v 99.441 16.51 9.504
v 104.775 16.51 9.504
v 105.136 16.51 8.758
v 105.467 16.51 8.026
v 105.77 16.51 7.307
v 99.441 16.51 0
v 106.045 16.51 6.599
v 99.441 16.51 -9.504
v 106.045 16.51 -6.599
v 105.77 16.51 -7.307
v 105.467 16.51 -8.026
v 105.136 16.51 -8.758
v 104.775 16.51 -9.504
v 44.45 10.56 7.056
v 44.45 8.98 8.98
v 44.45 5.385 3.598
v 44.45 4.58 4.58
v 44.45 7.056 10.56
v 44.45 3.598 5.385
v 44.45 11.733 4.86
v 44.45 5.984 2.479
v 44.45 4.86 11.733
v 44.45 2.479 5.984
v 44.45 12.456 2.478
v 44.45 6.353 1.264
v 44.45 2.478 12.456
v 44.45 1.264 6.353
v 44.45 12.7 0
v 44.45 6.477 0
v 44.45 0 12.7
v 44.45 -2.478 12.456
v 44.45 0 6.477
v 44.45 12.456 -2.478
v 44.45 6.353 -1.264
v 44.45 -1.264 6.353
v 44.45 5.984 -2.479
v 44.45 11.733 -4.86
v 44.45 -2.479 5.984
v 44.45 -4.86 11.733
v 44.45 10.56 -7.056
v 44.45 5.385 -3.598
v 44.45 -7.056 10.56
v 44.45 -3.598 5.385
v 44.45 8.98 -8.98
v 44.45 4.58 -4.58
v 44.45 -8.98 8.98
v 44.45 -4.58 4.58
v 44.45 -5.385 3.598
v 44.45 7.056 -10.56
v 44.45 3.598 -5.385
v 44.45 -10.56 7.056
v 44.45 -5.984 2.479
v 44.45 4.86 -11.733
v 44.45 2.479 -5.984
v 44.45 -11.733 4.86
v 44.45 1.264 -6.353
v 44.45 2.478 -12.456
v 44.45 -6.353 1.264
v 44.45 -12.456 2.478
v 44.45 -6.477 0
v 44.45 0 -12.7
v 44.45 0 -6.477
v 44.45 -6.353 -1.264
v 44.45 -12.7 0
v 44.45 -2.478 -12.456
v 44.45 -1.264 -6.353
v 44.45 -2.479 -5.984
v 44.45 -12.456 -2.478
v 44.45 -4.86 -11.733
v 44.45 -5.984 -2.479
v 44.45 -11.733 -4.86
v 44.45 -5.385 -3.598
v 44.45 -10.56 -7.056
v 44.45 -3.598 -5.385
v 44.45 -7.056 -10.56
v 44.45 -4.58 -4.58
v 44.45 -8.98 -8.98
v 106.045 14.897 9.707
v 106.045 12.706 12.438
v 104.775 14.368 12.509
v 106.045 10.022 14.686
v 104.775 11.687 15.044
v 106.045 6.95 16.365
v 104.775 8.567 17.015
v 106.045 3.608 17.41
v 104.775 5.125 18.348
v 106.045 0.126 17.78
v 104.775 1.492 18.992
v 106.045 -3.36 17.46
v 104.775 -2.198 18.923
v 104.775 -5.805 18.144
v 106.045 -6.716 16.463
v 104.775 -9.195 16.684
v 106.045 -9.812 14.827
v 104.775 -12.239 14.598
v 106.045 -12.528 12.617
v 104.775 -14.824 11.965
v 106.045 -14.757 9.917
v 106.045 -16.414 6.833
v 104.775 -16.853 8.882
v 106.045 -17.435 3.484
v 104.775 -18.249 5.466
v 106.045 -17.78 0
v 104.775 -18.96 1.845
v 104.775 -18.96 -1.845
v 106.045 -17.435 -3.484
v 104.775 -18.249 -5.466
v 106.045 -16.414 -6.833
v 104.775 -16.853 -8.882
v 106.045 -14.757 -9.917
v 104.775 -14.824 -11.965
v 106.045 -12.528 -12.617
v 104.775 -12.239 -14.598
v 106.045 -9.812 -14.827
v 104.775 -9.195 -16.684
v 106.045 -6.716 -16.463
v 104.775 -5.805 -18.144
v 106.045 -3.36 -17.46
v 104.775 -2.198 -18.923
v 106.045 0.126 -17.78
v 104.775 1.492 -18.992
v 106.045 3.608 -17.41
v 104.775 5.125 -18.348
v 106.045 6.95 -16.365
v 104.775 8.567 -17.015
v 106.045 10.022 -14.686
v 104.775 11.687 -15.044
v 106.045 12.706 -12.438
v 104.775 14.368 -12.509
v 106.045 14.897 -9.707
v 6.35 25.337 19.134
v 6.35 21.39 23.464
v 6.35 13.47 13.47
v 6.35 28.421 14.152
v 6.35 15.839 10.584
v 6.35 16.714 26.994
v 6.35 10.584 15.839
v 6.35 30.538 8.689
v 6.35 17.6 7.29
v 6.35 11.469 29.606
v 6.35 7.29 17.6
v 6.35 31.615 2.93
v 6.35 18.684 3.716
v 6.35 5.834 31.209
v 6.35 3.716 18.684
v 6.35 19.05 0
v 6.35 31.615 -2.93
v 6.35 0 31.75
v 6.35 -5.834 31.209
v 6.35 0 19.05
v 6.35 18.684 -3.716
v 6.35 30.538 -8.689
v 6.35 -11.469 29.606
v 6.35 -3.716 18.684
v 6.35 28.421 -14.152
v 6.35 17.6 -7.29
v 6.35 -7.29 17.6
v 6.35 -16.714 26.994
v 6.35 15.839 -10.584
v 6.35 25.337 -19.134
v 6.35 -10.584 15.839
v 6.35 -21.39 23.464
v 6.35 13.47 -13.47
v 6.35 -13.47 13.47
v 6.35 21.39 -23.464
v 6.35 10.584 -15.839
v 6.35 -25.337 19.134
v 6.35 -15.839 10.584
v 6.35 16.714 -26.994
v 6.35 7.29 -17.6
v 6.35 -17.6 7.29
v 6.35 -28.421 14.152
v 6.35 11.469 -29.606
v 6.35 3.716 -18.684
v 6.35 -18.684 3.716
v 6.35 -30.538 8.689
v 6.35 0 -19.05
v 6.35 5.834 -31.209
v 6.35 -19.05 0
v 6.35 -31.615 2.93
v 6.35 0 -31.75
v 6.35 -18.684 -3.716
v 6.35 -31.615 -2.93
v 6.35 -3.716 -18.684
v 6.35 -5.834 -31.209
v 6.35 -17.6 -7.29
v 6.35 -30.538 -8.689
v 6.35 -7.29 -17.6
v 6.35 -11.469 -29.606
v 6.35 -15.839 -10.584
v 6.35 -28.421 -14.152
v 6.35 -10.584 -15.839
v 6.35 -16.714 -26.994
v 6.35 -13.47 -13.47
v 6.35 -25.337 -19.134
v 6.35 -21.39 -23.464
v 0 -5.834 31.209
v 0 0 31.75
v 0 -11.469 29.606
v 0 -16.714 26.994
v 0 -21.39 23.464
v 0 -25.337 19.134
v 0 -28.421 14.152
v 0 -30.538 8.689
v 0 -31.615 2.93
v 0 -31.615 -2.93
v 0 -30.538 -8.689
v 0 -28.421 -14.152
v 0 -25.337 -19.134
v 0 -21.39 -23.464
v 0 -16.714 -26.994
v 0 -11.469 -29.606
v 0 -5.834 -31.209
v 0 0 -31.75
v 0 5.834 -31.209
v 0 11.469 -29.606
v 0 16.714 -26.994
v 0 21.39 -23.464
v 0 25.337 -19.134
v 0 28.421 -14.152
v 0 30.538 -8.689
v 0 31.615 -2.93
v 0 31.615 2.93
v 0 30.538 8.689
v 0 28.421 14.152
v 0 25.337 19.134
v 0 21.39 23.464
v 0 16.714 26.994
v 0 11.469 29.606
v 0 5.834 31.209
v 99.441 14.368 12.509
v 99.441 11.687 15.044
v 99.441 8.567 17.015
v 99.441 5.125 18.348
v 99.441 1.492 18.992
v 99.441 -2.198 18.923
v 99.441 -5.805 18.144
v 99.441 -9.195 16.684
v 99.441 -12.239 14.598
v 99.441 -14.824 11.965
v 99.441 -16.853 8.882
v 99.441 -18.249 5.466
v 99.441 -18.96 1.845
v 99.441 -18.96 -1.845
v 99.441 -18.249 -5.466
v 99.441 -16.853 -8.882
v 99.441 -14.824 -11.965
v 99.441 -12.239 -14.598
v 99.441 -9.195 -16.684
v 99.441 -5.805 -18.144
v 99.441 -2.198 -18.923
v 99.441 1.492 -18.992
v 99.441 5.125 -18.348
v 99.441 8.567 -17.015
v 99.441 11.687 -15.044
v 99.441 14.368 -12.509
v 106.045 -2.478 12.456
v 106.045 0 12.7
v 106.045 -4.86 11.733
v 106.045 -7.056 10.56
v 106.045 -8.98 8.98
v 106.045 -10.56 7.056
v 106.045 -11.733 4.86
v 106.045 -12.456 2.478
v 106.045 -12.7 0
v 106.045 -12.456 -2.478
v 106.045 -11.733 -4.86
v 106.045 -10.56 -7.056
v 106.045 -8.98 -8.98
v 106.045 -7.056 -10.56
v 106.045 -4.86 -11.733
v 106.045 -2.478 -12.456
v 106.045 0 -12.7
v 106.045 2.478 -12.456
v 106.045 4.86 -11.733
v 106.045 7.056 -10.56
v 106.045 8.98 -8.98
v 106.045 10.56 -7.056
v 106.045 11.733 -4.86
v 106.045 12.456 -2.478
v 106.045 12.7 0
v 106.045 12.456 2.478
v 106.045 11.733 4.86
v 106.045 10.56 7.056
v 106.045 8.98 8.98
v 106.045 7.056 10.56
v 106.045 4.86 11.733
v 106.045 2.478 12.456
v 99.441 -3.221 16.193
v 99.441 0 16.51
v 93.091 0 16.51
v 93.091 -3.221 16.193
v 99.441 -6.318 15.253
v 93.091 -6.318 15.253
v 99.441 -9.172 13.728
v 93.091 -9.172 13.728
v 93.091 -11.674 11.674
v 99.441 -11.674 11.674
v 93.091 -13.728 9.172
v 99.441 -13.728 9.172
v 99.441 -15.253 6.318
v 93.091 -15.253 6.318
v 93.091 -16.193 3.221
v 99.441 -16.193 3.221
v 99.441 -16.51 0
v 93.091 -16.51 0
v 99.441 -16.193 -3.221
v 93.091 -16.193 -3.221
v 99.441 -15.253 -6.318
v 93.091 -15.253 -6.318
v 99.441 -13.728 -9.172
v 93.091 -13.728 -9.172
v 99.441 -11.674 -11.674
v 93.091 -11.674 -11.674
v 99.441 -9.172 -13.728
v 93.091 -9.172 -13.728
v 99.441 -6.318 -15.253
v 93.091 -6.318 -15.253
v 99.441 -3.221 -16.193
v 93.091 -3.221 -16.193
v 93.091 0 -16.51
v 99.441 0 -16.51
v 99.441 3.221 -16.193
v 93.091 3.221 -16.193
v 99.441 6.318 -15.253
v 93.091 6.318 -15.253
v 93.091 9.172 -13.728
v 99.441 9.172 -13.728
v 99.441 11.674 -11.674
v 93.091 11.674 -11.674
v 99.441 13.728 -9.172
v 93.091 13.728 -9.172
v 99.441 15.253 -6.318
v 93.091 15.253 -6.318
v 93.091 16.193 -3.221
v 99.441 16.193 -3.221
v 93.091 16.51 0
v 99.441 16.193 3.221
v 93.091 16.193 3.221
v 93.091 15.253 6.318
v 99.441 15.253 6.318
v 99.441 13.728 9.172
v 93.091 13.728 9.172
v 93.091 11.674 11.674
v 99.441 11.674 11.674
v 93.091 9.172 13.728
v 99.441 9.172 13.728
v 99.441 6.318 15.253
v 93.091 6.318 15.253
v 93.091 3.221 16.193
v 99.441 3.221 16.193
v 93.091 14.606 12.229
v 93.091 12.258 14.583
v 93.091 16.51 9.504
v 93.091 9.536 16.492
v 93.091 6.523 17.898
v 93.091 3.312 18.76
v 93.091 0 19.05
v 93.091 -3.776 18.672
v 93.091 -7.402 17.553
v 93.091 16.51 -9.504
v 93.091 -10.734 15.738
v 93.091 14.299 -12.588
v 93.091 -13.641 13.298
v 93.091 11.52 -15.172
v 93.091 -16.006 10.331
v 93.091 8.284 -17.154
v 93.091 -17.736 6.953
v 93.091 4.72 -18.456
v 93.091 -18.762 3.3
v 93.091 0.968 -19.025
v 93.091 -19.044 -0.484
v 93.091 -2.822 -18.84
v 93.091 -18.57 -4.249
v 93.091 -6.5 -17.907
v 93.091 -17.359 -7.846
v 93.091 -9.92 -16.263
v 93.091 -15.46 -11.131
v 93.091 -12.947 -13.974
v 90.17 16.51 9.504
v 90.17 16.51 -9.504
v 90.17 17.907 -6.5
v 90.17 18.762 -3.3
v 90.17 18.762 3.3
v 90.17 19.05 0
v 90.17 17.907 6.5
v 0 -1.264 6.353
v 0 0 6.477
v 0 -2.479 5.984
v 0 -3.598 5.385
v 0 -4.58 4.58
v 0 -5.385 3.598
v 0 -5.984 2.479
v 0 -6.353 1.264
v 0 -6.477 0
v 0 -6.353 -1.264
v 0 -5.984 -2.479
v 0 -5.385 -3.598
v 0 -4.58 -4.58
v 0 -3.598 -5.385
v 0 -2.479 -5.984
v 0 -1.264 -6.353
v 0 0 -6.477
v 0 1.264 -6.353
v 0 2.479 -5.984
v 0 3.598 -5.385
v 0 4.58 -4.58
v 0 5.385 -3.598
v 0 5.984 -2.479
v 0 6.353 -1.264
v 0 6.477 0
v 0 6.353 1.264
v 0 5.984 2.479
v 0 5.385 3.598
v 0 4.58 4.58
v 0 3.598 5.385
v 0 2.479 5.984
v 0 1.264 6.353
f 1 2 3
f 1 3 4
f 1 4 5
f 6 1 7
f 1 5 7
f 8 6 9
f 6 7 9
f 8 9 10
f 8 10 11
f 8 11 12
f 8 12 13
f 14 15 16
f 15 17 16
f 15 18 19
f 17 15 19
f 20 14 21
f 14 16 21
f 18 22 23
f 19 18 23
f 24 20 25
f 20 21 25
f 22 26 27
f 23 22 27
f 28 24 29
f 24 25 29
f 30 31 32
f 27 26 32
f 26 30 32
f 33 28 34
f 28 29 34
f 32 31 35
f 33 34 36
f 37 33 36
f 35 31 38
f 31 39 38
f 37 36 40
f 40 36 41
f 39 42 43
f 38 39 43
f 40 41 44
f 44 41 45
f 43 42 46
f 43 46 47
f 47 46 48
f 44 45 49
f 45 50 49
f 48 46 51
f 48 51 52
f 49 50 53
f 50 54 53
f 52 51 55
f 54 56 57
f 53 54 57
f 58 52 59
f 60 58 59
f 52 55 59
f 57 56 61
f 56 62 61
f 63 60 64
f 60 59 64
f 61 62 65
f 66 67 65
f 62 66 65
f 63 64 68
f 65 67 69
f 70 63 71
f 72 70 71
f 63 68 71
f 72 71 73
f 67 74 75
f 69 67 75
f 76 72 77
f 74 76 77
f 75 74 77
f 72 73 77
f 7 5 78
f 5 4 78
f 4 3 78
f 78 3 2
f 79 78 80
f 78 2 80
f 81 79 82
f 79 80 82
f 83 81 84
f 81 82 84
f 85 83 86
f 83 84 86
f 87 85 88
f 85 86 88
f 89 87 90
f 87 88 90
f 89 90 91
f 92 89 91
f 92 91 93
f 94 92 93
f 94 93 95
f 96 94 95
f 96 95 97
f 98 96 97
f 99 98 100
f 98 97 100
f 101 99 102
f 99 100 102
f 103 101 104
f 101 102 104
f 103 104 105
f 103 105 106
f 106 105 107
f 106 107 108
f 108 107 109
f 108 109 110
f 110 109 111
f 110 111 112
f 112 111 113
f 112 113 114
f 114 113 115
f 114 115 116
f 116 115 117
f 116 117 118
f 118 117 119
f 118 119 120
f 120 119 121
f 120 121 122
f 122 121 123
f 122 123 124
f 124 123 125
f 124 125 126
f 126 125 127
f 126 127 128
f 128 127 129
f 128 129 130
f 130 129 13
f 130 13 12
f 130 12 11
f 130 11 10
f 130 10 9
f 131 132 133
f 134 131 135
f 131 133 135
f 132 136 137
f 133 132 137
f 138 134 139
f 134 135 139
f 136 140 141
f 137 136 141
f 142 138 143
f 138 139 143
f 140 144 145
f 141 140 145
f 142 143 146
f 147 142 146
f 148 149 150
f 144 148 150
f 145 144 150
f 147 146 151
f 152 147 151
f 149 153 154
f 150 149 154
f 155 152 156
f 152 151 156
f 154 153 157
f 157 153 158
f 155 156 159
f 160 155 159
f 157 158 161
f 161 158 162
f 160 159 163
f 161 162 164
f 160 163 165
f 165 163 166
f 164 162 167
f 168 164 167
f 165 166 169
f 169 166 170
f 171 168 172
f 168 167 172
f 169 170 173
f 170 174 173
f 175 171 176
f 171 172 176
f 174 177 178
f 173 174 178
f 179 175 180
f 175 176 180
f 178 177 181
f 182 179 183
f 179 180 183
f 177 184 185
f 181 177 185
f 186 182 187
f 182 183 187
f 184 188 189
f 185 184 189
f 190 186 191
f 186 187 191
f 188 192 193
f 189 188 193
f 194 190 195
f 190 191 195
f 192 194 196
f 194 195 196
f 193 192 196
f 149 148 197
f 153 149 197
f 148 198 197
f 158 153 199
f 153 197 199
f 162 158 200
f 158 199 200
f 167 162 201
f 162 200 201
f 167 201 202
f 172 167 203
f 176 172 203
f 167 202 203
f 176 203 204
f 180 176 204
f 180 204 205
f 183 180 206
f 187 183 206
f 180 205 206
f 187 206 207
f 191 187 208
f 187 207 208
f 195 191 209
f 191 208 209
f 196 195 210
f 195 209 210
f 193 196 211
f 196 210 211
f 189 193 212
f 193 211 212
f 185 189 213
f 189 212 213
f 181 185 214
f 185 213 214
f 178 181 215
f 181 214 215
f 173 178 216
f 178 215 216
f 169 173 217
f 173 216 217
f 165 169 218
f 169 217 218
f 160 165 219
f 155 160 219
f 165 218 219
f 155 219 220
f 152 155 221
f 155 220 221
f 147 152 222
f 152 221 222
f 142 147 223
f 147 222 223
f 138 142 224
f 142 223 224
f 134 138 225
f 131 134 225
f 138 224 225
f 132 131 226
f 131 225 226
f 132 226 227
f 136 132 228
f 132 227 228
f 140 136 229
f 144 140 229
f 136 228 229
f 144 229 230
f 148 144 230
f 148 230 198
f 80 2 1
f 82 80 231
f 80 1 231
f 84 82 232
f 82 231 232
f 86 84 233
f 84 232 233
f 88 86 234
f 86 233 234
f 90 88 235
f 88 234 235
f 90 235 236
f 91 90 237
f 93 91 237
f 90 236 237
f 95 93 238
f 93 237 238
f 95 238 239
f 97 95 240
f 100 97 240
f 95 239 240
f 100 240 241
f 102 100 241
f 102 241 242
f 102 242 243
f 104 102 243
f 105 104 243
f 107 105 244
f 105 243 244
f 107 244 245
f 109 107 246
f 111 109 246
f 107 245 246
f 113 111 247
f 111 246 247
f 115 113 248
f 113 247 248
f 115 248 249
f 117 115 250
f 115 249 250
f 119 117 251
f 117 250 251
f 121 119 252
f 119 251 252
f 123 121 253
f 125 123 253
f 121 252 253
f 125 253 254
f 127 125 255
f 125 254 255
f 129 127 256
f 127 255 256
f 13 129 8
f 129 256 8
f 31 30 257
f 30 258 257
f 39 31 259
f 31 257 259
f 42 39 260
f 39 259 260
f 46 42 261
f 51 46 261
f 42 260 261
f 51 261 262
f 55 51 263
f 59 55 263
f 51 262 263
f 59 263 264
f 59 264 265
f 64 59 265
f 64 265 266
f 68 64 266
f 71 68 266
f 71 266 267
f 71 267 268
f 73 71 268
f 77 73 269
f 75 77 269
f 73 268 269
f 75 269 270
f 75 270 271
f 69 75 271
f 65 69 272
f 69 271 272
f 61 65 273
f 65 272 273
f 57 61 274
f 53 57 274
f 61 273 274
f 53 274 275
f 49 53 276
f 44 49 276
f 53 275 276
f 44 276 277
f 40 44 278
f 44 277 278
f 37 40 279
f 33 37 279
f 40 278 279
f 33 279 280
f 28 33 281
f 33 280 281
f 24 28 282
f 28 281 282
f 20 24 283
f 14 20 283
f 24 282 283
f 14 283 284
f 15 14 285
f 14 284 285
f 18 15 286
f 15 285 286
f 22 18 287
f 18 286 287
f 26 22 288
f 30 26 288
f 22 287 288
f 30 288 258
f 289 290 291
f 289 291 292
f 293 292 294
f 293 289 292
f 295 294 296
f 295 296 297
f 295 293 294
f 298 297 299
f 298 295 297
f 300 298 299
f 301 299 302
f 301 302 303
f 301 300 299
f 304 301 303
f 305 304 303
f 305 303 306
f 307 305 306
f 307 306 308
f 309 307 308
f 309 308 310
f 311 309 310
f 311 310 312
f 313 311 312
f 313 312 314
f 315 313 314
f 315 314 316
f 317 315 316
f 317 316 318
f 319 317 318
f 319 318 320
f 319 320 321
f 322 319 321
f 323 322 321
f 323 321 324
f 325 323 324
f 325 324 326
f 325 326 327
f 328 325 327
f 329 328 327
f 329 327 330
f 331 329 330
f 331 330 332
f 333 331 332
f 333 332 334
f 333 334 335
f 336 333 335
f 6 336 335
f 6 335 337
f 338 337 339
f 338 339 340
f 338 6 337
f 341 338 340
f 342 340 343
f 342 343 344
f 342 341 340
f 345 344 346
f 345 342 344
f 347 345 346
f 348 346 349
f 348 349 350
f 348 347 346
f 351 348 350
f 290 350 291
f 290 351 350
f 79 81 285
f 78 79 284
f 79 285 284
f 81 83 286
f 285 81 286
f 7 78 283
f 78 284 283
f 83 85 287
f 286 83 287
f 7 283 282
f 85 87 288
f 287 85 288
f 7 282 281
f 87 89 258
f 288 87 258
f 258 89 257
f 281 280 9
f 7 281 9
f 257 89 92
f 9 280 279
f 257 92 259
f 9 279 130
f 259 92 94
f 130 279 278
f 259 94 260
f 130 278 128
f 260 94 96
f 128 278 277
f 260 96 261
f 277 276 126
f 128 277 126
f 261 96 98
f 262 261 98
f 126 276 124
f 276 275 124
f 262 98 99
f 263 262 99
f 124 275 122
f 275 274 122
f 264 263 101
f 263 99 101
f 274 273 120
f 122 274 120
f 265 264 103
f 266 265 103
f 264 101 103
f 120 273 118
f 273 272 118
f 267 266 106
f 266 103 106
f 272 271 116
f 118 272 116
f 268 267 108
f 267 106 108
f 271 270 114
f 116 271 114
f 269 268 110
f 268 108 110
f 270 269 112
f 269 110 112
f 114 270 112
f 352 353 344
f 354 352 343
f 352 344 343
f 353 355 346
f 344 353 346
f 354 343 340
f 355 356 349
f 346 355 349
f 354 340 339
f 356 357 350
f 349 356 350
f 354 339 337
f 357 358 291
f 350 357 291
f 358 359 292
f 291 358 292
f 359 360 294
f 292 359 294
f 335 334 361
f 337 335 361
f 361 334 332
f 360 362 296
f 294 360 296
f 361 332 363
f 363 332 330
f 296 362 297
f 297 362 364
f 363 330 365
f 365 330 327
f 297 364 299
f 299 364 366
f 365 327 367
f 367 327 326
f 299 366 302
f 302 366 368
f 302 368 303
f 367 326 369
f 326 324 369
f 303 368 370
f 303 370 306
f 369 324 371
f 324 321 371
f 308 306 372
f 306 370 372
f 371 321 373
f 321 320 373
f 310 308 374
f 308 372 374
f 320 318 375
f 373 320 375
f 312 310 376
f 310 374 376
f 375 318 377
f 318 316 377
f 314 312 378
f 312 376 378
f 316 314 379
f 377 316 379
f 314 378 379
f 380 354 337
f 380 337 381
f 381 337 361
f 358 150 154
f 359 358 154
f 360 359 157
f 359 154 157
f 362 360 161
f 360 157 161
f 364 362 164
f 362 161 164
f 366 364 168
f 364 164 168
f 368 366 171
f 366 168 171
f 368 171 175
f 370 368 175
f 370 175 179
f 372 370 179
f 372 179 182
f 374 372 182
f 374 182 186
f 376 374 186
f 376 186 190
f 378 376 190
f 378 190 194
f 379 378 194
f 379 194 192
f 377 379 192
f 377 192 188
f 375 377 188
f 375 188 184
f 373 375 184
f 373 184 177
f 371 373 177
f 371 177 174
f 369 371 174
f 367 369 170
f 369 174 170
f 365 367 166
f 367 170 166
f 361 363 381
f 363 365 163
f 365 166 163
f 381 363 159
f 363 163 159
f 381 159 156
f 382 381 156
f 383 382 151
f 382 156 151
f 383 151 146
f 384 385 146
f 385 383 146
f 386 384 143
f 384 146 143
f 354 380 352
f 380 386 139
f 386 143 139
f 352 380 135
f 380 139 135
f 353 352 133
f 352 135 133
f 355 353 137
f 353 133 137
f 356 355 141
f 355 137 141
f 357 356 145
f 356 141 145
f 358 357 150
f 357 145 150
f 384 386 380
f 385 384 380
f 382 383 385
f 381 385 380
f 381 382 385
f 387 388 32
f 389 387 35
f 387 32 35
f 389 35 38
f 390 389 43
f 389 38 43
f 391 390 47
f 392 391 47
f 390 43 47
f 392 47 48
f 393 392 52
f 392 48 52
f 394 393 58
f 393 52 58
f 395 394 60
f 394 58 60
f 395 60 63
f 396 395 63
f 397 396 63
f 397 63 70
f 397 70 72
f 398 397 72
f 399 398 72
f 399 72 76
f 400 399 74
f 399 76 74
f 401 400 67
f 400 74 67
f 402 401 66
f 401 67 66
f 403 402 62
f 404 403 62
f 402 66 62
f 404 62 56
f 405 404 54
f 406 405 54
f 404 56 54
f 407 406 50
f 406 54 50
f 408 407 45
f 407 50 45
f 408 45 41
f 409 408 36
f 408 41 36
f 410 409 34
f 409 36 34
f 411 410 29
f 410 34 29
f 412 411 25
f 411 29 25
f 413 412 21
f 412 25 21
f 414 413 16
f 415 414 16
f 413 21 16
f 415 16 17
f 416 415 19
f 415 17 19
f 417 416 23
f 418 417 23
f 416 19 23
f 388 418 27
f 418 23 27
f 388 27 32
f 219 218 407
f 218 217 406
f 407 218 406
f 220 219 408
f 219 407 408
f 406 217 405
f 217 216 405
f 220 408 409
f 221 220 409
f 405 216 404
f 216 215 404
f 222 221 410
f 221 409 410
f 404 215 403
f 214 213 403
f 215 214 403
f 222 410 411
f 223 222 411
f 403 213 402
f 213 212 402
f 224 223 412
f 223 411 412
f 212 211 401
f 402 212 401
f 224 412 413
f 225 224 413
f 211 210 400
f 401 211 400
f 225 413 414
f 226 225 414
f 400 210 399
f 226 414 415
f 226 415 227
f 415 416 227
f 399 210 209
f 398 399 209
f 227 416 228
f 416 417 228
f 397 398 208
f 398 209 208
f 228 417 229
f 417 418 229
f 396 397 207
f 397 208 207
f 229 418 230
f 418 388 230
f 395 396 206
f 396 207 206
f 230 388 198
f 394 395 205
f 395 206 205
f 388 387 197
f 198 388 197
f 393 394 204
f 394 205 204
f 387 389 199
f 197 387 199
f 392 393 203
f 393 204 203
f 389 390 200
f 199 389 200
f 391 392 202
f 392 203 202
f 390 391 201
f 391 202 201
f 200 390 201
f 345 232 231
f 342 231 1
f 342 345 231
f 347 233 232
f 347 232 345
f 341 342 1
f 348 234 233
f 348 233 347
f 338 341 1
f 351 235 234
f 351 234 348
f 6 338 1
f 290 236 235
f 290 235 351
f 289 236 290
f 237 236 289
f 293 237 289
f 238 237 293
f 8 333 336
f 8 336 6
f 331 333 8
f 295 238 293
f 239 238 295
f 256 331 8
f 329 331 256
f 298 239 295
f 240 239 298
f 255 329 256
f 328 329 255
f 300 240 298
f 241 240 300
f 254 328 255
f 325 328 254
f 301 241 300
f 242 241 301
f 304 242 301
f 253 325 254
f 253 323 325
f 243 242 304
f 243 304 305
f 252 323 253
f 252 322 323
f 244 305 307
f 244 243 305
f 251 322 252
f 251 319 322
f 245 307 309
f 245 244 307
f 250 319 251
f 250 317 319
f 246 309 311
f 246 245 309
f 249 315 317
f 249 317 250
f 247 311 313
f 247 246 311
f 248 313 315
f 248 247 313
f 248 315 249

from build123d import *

# Parameters (mm, degrees)
SKETCH2_W          = 162.317604445
SKETCH2_H          = 55.549243825
CUT_EXTRUDE1_DEPTH = 15.875
SKETCH3_W          = 6.35
SKETCH3_H          = 3.175
CHAMFER1_SIZE      = 1.27


with BuildPart() as part:
    # Sketch1 → Revolve1 (revolve)
    with BuildSketch(Plane.XY, mode=Mode.PRIVATE) as revolve1_sk:
        Polygon((0, 31.75), (0, 6.477), (44.45, 6.477), (44.45, 12.7), (106.045, 12.7), (106.045, 19.05), (6.35, 19.05), (6.35, 31.75), align=None)
    revolve(revolve1_sk.sketch.rotate(Axis((0, 0, 0), (1, 0, 0)), 90), axis=Axis((0, 0, 0), (1, 0, 0)))

    # Sketch2 → Cut-Extrude1 (cut)
    with BuildSketch(Plane(origin=(106.045, 0, 0), x_dir=(0, 0, -1), z_dir=(1, 0, 0))):
        with Locations((1.710934167, 44.284621913)):
            Rectangle(SKETCH2_W, SKETCH2_H)
    extrude(amount=-CUT_EXTRUDE1_DEPTH, mode=Mode.SUBTRACT)

    # Sketch3 → Cut-Revolve1 (revolve, cut)
    with BuildSketch(Plane.XY, mode=Mode.PRIVATE) as cut_revolve1_sk:
        with Locations((96.266, 18.0975)):
            Rectangle(SKETCH3_W, SKETCH3_H)
    revolve(cut_revolve1_sk.sketch.rotate(Axis((0, 0, 0), (1, 0, 0)), 90), axis=Axis((0, 0, 0), (1, 0, 0)), mode=Mode.SUBTRACT)

    # Chamfer1
    chamfer1_edges = [part.edges().sort_by_distance(p)[0] for p in [
        (106.045, -19.05, 0),
    ]]
    chamfer(chamfer1_edges, length=CHAMFER1_SIZE)


solid = part.part
